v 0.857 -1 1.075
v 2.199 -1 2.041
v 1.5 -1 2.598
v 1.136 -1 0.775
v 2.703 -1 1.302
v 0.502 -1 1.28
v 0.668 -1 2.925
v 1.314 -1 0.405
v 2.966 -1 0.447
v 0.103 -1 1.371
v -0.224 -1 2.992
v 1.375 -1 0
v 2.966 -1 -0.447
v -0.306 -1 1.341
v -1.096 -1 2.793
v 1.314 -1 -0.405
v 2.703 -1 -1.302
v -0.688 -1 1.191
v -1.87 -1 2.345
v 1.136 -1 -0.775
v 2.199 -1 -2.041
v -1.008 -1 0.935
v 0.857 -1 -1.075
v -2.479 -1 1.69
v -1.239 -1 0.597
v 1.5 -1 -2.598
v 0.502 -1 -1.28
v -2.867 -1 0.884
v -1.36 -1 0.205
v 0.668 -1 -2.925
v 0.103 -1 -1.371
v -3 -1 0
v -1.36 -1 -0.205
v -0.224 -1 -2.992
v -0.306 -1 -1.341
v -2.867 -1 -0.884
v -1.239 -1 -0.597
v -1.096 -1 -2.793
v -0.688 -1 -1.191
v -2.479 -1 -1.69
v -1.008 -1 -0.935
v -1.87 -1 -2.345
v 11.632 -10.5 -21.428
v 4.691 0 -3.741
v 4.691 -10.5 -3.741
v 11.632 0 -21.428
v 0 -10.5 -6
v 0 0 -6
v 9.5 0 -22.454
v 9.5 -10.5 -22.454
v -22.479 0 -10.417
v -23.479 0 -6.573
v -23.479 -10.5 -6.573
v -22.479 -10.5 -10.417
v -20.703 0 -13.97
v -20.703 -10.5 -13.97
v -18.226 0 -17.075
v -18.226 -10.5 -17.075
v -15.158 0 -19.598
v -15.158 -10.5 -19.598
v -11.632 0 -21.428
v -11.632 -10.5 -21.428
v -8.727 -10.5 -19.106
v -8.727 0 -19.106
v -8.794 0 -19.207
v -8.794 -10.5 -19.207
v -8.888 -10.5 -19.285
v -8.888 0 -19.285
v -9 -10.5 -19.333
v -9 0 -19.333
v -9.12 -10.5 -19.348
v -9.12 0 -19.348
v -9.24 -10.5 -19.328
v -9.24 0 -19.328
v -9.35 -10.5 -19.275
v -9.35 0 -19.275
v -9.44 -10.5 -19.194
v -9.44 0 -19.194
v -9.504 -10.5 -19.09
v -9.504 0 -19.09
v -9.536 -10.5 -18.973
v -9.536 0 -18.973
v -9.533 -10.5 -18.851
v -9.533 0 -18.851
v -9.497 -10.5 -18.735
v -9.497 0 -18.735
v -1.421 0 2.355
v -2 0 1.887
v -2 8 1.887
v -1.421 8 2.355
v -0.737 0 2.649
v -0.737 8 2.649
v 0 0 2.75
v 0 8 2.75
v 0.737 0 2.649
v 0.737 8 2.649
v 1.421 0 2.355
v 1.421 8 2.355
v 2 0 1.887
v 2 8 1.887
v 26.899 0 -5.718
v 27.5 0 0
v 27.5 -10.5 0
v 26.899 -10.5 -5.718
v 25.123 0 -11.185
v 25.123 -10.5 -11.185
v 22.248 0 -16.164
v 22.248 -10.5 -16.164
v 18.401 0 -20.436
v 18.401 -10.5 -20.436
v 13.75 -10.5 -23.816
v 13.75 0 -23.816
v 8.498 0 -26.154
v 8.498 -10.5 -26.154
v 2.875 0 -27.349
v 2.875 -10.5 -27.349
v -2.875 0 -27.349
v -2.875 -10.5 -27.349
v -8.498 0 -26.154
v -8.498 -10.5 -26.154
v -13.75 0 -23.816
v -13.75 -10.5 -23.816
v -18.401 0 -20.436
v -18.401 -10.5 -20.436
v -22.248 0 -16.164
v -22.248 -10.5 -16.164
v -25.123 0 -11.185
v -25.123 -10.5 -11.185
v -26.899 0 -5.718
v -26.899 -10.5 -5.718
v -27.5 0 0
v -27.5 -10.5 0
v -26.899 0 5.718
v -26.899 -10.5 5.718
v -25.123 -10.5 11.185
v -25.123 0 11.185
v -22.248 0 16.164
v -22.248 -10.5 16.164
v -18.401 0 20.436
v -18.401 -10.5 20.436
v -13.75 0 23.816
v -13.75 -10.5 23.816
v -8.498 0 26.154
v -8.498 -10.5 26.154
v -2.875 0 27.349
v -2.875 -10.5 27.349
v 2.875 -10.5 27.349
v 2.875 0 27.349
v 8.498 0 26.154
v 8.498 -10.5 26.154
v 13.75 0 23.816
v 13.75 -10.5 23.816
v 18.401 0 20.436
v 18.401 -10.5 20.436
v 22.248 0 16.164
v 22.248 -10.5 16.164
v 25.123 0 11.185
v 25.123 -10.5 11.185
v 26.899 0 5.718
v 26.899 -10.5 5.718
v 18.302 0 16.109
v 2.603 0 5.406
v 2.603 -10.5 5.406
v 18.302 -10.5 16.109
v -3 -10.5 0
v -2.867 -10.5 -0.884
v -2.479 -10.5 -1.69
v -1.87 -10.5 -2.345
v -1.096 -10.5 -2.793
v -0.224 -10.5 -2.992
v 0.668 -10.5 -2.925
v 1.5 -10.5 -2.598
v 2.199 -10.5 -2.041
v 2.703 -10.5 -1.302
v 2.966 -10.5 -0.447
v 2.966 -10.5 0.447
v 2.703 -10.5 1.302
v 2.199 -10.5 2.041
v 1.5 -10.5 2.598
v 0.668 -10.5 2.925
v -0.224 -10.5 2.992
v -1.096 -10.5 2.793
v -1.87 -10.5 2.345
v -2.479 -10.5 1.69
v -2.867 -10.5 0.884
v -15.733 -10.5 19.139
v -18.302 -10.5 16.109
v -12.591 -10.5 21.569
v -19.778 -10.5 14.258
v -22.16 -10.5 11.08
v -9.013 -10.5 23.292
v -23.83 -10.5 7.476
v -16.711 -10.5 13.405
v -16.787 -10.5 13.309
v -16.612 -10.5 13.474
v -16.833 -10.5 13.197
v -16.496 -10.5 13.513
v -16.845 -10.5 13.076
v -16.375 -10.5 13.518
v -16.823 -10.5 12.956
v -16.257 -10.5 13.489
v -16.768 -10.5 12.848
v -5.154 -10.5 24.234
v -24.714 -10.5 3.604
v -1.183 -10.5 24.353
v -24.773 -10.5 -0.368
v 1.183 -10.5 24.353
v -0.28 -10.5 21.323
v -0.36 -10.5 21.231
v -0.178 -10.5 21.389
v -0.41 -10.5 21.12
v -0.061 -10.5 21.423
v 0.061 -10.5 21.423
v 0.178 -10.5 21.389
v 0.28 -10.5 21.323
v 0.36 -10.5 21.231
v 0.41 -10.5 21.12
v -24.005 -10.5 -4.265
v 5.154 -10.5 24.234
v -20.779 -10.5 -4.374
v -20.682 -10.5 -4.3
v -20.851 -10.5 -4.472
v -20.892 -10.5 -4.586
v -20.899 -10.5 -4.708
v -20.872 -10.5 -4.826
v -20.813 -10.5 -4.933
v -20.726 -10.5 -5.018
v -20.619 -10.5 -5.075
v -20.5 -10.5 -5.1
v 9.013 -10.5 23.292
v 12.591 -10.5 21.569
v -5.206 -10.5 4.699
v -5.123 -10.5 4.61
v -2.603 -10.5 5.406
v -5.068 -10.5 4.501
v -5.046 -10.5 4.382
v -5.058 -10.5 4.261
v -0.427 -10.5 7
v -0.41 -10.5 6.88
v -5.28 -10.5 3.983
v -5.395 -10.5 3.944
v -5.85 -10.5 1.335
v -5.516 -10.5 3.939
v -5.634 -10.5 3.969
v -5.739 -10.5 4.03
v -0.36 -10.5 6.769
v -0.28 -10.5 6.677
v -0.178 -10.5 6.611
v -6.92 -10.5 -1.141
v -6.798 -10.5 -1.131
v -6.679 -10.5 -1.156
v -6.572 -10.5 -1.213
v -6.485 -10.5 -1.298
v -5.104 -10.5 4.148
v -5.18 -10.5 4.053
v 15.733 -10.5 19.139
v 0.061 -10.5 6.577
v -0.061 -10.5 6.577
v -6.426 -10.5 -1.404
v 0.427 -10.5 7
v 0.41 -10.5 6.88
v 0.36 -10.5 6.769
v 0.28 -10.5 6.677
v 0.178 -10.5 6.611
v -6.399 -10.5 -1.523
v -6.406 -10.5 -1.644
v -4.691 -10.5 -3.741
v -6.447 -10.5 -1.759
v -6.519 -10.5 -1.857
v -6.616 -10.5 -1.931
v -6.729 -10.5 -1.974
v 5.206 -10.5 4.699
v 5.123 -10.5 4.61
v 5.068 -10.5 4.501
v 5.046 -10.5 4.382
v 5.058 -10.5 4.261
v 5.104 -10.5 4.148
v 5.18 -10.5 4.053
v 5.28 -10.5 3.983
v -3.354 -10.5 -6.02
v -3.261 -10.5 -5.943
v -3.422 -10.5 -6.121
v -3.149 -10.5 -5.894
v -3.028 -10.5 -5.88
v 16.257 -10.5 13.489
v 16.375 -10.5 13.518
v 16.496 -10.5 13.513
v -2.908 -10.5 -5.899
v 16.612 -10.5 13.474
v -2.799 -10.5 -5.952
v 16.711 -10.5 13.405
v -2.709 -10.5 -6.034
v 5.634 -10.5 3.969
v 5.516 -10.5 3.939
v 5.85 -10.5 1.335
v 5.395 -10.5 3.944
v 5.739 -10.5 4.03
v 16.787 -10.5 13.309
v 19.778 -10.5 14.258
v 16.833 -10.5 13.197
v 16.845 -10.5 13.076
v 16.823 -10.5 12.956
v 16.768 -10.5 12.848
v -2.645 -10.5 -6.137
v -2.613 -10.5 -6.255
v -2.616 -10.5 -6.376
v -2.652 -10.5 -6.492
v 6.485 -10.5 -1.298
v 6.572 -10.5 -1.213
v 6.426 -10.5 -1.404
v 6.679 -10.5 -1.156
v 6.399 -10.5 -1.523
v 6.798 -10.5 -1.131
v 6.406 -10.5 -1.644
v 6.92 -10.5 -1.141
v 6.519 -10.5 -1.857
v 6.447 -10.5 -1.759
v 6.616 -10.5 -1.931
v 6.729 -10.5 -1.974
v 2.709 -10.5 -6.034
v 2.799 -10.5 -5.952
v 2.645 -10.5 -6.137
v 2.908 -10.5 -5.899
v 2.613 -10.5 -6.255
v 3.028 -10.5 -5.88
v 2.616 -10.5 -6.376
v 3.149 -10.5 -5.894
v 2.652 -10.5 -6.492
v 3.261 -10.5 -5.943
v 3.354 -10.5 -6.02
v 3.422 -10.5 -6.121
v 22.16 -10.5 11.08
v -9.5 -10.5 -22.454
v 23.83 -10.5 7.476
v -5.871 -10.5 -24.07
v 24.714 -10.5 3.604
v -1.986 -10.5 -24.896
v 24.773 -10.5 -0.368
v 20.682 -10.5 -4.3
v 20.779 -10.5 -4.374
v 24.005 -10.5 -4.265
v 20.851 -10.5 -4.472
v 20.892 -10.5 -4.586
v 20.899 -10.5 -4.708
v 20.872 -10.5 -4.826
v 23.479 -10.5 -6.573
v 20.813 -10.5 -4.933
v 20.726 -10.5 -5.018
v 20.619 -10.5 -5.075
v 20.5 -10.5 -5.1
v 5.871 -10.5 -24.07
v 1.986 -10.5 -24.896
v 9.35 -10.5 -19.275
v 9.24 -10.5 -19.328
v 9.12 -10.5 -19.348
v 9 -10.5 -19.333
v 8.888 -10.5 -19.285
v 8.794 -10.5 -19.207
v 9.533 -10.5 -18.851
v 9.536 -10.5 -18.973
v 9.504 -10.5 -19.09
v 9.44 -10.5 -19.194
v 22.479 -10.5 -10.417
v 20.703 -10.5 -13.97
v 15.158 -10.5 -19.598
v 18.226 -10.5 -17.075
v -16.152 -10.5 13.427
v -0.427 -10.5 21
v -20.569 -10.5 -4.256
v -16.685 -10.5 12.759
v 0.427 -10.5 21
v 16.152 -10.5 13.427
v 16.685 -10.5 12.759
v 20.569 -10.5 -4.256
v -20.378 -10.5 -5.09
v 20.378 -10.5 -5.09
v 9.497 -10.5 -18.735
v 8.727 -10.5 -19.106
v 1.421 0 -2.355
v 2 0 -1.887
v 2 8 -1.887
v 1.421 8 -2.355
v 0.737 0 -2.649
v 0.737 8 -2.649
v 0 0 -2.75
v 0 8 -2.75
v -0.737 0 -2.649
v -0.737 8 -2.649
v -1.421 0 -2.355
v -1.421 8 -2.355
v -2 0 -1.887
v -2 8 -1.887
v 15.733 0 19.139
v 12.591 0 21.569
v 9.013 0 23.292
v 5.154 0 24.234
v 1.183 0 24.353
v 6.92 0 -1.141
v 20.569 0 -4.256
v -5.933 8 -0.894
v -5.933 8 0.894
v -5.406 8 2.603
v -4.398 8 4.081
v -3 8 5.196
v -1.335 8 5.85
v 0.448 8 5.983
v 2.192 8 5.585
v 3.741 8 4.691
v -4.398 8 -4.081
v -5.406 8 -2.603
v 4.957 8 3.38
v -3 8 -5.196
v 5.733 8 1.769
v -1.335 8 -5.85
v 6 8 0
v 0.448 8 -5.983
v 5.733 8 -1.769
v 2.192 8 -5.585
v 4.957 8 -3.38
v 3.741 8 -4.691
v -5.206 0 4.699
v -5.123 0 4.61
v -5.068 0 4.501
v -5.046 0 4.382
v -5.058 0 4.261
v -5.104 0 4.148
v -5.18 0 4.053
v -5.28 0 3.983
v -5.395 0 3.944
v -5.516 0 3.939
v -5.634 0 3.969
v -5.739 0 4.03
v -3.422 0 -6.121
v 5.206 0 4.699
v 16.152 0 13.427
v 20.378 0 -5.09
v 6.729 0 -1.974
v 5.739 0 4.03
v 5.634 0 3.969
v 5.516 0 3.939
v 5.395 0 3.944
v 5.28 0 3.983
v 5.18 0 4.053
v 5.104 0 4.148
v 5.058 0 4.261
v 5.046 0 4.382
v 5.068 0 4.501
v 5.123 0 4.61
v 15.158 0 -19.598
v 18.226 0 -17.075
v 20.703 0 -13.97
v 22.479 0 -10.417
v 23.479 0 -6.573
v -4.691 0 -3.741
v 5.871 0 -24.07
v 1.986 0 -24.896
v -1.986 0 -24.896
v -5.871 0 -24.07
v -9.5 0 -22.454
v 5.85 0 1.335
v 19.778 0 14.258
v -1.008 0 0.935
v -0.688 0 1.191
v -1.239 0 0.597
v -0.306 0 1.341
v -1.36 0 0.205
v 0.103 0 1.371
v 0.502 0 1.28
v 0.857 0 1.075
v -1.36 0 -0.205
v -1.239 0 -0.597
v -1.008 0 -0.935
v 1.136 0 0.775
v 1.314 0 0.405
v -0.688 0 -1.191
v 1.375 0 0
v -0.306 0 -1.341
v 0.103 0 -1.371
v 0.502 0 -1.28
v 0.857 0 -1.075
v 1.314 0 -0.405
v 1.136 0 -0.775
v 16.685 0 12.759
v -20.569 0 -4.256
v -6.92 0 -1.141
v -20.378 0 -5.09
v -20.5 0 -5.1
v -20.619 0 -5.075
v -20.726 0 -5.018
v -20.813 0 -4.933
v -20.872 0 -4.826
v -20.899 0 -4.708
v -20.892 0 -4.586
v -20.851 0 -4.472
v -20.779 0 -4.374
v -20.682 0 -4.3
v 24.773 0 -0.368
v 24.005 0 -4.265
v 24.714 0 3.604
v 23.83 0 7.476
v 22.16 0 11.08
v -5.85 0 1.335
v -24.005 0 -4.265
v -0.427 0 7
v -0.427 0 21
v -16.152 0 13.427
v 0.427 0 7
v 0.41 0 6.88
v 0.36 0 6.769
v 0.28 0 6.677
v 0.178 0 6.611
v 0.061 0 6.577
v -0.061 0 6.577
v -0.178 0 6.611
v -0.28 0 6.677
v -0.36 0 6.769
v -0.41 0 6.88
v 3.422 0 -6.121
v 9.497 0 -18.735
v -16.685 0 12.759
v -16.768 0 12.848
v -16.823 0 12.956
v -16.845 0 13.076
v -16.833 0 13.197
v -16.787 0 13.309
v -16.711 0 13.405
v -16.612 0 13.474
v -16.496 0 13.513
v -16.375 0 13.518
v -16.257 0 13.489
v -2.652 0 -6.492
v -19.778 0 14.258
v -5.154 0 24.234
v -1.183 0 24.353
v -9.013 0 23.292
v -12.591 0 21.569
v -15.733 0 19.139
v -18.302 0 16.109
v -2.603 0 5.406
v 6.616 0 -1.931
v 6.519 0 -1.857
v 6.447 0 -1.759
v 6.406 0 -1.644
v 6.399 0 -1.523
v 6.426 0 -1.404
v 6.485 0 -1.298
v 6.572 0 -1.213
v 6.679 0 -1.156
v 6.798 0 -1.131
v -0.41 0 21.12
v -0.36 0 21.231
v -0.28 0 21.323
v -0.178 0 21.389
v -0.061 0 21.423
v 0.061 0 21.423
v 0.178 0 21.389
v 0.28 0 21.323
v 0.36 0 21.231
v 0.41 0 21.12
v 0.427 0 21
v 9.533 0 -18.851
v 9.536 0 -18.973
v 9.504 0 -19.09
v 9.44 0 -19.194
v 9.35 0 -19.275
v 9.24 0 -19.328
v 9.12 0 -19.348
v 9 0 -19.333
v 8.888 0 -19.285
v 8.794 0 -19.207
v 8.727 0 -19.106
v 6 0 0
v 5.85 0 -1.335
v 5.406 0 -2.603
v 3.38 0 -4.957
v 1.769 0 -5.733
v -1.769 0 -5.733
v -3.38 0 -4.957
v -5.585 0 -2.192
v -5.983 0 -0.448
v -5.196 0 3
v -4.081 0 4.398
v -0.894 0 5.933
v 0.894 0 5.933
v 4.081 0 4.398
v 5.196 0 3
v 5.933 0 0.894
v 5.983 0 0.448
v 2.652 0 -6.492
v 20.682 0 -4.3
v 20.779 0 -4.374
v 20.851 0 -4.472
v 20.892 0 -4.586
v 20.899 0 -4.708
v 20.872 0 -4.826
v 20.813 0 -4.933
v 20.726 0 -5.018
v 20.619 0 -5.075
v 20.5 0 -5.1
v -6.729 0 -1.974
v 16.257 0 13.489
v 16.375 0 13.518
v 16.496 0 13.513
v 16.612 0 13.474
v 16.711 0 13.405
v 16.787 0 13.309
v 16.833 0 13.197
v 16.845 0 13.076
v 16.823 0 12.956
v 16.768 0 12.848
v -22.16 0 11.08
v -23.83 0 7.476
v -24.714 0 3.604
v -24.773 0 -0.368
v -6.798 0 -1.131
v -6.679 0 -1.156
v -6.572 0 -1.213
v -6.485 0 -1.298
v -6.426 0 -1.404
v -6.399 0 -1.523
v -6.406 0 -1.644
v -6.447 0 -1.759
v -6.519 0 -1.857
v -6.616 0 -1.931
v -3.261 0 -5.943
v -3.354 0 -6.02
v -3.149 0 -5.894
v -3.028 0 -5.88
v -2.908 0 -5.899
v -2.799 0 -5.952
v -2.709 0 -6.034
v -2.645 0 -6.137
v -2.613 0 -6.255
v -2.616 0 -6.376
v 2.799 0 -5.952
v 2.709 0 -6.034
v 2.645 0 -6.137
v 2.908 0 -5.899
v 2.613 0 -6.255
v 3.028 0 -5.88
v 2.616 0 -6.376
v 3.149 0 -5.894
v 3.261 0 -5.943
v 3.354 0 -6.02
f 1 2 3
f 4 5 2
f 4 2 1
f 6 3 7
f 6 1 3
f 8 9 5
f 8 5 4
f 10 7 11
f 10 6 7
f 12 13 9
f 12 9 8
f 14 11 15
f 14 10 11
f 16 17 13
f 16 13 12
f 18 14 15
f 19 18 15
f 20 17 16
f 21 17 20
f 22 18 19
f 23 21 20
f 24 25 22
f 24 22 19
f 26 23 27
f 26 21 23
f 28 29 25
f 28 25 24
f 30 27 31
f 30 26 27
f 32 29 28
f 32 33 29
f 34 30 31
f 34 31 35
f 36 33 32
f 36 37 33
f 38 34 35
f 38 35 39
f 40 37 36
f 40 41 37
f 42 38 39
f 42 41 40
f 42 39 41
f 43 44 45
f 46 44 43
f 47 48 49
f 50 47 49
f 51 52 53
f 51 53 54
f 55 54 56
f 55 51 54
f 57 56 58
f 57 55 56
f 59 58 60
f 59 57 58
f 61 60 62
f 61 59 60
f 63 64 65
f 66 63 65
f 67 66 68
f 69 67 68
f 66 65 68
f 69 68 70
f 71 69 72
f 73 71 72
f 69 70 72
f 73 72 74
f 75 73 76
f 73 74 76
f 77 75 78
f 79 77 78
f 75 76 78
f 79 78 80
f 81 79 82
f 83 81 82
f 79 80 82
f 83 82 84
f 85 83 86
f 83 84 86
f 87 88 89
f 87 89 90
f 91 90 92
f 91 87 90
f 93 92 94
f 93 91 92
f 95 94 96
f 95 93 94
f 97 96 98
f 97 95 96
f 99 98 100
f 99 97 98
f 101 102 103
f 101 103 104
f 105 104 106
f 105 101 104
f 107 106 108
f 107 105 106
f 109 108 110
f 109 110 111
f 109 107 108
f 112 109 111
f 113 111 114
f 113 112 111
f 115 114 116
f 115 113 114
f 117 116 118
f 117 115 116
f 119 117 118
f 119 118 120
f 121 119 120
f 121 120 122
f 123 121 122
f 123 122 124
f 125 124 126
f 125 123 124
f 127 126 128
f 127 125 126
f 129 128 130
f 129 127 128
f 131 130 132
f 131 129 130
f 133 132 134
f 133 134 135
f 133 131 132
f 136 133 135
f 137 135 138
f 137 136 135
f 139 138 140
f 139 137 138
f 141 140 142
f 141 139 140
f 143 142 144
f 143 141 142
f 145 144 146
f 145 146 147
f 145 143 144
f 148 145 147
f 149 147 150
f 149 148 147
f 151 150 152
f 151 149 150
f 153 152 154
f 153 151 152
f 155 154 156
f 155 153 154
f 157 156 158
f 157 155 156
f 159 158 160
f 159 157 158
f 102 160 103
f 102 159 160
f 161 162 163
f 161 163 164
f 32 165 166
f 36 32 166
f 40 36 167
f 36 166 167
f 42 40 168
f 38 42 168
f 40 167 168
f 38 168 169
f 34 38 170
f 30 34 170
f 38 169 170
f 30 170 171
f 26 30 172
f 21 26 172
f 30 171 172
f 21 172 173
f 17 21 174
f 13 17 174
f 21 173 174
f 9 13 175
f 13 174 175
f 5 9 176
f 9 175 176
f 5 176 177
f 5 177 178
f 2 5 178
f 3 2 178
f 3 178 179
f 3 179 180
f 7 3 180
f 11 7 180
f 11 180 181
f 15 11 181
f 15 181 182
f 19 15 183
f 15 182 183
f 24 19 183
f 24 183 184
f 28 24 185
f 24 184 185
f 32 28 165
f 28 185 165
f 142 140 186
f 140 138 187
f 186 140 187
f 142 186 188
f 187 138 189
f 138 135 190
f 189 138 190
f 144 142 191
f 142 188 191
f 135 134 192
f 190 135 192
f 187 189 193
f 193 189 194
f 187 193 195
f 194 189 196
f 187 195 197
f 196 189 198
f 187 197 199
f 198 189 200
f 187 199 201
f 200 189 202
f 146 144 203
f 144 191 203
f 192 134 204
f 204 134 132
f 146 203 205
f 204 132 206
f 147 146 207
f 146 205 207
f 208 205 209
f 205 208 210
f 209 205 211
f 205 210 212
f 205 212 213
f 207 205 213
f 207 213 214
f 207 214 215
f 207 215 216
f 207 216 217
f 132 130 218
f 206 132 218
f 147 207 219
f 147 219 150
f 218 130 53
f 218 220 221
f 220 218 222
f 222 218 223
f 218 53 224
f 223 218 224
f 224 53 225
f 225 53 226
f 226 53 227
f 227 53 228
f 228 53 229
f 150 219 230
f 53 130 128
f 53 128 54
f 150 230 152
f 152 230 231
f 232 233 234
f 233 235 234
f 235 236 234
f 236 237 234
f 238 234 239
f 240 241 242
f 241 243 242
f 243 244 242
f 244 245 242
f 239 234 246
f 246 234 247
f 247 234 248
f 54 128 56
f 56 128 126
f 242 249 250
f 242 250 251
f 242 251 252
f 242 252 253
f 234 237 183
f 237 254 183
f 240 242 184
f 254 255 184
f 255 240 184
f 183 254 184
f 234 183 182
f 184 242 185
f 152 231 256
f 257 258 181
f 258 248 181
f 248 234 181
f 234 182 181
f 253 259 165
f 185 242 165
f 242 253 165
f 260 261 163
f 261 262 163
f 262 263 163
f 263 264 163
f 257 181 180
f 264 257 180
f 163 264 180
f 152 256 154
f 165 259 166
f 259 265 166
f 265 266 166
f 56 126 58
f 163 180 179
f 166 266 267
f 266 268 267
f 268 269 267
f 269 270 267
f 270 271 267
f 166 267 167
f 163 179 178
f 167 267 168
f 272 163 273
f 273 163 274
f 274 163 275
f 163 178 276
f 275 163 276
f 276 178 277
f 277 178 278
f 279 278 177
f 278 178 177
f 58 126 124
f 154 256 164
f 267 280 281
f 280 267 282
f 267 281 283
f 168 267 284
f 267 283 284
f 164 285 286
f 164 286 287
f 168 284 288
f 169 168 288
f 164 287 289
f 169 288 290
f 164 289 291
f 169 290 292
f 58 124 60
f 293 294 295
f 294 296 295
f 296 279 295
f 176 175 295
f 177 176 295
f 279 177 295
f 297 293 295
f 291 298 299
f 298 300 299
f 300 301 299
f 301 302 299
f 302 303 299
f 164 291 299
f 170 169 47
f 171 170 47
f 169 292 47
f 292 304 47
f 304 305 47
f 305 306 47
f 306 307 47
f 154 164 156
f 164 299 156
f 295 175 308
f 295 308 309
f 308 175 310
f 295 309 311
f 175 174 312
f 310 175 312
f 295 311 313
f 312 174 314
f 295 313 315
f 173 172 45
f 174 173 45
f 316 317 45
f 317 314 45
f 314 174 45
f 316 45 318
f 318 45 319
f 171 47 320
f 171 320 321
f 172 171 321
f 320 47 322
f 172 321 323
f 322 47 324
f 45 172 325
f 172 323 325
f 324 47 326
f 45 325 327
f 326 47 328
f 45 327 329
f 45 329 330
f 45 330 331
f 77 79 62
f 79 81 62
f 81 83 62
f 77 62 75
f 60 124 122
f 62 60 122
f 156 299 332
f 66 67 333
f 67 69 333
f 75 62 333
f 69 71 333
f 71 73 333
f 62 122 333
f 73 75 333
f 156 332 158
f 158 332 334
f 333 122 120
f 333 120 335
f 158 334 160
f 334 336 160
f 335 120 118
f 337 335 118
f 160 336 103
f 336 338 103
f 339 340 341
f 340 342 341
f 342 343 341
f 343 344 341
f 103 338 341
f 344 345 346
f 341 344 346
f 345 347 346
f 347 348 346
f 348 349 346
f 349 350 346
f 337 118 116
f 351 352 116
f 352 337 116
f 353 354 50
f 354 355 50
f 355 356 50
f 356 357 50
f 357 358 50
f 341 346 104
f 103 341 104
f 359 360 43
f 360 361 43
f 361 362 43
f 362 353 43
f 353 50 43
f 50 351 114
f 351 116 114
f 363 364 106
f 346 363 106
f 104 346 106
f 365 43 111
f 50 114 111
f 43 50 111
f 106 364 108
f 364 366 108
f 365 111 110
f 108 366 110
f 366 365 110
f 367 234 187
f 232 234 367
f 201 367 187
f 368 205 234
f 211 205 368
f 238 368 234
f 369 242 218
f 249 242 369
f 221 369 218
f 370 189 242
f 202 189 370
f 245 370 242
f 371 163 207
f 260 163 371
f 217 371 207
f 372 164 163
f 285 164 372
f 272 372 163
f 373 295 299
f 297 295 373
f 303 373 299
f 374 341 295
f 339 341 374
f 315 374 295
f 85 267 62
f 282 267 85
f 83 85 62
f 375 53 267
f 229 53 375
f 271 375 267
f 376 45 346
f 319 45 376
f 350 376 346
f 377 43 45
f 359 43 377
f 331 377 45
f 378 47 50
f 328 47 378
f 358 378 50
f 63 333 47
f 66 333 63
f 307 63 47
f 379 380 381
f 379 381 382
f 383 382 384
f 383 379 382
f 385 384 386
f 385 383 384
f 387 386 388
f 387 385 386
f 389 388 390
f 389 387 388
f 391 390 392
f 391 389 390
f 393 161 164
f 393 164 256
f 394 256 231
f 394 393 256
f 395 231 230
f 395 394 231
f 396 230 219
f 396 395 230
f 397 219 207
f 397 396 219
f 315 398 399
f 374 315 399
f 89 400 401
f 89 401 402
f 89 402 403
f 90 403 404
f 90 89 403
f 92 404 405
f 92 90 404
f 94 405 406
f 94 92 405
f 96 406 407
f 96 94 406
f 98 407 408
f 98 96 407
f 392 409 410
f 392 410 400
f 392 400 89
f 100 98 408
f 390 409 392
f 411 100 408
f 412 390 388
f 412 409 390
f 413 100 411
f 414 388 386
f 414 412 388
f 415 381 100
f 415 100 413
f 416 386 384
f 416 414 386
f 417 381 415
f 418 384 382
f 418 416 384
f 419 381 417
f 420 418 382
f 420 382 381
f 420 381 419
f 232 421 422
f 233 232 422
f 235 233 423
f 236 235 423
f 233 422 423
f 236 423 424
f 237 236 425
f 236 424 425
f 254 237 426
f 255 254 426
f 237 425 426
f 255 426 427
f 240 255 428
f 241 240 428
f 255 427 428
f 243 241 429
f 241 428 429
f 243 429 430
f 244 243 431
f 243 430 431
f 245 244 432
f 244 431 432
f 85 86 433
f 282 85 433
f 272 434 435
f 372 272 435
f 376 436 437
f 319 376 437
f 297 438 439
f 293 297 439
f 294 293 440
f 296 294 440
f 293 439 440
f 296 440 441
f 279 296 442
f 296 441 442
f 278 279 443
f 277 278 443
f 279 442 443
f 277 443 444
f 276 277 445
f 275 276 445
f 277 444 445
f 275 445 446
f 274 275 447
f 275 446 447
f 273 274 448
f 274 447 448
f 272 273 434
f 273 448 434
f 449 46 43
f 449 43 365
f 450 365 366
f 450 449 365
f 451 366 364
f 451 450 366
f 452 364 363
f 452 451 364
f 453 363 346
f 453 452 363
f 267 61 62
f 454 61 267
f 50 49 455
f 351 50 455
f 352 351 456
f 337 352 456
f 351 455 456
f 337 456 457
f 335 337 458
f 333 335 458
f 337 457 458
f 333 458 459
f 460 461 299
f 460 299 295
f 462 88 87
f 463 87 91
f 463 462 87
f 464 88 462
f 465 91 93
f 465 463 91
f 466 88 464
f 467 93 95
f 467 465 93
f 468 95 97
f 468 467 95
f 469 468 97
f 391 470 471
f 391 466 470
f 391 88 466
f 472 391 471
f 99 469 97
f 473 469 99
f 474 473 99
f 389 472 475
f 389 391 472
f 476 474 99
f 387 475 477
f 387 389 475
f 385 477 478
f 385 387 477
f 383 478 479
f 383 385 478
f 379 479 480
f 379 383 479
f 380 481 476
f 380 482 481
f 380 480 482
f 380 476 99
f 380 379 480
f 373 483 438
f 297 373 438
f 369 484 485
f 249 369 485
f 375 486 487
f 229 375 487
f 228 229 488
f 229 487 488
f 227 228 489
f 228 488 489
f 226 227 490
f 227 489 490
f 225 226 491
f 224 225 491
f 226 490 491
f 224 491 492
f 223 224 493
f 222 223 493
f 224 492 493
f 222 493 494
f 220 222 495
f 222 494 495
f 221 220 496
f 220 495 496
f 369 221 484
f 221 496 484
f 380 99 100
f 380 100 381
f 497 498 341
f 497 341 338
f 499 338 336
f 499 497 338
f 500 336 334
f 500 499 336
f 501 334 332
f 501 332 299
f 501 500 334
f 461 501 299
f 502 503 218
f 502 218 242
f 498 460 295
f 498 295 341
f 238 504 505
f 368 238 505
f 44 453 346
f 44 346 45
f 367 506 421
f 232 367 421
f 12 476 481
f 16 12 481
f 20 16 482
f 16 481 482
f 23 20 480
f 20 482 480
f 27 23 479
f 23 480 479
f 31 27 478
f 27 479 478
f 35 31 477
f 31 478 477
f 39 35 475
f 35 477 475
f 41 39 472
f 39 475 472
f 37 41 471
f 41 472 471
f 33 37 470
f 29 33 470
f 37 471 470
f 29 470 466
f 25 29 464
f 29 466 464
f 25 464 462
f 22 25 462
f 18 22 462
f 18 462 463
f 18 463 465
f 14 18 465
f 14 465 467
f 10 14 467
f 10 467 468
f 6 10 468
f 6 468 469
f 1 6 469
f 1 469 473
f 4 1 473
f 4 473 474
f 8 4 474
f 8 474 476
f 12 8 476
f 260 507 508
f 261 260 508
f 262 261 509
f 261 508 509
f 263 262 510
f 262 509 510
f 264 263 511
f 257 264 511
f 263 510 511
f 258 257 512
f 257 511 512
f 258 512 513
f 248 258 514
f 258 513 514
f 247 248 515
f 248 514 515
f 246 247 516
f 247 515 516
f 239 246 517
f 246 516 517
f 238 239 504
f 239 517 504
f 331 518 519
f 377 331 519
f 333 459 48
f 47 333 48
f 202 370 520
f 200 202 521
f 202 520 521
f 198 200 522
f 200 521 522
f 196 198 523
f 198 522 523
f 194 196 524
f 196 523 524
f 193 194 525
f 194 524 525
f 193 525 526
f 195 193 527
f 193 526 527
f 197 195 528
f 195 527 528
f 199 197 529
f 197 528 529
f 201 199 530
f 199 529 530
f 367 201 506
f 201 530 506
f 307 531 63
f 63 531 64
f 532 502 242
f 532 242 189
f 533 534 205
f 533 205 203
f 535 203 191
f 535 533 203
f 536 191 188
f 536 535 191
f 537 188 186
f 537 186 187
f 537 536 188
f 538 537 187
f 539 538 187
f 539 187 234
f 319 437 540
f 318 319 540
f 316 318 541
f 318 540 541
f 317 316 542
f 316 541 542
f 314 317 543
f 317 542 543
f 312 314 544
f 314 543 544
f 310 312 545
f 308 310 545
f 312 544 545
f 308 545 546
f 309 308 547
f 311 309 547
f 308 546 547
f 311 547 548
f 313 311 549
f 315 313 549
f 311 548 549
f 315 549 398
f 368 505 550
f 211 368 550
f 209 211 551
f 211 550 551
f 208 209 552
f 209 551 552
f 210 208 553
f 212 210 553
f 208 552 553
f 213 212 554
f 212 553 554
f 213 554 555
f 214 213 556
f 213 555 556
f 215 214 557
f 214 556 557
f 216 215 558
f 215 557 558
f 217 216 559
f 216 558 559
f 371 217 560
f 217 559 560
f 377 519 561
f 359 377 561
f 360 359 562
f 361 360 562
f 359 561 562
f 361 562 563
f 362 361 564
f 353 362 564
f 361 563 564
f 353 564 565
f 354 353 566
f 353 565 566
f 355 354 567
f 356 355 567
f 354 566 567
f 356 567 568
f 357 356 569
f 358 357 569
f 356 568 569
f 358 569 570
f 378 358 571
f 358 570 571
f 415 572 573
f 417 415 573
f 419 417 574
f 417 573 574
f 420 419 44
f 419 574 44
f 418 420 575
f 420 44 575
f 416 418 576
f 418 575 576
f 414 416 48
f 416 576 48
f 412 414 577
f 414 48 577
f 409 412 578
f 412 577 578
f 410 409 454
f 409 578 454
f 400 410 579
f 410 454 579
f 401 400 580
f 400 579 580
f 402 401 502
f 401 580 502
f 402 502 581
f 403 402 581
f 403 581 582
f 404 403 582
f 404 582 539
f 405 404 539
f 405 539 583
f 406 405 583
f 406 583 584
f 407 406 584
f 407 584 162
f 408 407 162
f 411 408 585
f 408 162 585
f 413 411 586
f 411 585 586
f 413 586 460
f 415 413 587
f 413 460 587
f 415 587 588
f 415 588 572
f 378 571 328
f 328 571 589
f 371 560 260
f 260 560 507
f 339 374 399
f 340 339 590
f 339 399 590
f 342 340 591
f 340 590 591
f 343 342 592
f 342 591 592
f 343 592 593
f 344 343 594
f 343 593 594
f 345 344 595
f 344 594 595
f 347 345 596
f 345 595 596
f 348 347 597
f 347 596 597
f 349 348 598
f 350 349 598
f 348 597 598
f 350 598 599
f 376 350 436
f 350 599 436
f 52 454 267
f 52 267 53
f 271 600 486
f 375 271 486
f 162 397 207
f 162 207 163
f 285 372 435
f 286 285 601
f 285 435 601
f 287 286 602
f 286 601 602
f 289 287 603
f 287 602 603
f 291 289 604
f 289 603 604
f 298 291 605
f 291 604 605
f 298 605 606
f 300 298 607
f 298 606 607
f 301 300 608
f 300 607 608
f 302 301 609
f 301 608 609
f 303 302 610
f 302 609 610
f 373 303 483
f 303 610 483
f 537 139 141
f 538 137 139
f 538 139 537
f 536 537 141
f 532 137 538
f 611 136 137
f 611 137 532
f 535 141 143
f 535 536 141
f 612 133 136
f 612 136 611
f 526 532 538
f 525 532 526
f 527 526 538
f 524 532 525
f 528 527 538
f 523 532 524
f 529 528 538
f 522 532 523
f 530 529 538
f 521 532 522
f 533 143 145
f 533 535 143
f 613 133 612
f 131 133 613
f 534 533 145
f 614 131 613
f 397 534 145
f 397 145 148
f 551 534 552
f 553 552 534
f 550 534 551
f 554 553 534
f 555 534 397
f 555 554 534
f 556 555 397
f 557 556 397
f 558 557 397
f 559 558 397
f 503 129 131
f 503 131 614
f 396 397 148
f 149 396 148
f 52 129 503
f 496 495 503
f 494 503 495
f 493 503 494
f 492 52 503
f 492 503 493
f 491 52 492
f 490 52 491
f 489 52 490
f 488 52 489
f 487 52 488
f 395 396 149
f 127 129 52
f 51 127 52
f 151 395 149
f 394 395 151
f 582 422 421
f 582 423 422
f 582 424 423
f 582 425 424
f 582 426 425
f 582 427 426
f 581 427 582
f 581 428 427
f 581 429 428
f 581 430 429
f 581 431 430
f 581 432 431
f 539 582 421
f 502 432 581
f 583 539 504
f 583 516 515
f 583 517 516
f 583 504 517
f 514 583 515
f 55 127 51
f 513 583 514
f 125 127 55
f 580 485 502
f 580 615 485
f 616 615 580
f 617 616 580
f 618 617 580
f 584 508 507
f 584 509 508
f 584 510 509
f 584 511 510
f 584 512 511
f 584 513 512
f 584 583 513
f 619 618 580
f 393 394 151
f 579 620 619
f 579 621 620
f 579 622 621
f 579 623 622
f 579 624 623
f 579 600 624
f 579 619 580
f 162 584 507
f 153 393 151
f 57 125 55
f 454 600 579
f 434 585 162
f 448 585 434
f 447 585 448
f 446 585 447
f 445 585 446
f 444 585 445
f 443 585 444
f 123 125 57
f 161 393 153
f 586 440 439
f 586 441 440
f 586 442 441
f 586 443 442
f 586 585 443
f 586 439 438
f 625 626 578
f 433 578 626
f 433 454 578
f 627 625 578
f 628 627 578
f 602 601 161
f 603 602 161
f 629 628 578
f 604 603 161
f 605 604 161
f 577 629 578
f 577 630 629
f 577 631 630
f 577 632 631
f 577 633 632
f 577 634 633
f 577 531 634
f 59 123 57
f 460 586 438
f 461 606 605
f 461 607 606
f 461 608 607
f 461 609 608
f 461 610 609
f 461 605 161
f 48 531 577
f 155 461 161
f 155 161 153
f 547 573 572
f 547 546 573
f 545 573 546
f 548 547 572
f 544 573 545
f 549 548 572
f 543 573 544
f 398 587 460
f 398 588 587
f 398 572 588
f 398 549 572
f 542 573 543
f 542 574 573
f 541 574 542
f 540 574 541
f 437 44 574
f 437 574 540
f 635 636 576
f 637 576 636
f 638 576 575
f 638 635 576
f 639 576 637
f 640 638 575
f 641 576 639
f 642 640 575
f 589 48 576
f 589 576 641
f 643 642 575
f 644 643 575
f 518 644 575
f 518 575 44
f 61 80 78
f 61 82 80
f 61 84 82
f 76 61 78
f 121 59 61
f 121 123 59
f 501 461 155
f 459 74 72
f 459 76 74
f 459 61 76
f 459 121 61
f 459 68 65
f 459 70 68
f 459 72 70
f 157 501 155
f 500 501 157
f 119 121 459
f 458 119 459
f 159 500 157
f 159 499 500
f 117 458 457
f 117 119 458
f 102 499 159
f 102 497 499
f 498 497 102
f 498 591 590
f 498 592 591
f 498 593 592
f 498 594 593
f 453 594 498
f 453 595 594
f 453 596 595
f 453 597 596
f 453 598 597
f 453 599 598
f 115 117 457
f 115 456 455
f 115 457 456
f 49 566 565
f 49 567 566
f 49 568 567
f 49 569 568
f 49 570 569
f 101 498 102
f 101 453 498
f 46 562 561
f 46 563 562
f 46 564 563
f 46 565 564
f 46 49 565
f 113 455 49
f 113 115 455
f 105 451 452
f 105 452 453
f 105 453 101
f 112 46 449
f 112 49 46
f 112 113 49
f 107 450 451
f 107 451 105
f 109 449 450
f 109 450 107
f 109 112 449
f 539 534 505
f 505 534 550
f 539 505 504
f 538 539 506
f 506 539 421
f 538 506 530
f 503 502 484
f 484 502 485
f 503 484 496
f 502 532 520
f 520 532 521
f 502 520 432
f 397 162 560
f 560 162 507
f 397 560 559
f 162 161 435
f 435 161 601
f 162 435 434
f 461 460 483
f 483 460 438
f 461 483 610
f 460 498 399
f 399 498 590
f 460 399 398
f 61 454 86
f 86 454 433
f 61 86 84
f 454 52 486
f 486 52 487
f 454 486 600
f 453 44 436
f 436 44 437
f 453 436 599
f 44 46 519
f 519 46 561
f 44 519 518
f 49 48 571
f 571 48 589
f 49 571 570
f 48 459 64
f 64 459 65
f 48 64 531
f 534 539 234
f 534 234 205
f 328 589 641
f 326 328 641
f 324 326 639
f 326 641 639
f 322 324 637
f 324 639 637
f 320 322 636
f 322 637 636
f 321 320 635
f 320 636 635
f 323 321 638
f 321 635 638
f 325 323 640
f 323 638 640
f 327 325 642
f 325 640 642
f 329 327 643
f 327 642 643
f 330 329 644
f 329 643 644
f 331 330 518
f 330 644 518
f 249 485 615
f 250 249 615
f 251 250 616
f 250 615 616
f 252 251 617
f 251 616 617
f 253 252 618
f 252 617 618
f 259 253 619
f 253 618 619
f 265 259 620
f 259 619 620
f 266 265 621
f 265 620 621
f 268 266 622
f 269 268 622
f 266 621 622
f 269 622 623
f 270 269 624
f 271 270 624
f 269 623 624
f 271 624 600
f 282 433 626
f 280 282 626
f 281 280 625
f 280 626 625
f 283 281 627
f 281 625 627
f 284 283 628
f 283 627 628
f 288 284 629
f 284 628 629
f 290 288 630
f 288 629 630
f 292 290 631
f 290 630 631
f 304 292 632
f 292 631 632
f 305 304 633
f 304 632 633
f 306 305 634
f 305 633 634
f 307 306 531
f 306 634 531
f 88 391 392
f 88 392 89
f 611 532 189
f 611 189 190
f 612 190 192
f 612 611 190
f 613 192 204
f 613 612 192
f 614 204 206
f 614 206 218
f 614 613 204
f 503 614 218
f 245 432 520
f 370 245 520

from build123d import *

# Parameters (mm, degrees)
SKETCH2_R           = 6
BOSS_EXTRUDE1_DEPTH = 8
SKETCH3_R           = 27.5
SKETCH3_R_2         = 1.375
BOSS_EXTRUDE2_DEPTH = 10.5
SKETCH4_R           = 3
CUT_EXTRUDE1_DEPTH  = 9.5
CUT_EXTRUDE2_REACH  = 12.5


with BuildPart() as part:
    # Sketch2 → Boss-Extrude1 (new body)
    with BuildSketch(Plane(origin=(0, 0, 0), x_dir=(1, 0, 0), z_dir=(0, 1, 0))):
        Circle(SKETCH2_R)
        with BuildLine():
            ThreePointArc((-2, -1.887458609), (0, -2.75), (2, -1.887458609))
            Line((2, -1.887458609), (2, 1.887458609))
            ThreePointArc((2, 1.887458609), (0, 2.75), (-2, 1.887458609))
            Line((-2, 1.887458609), (-2, -1.887458609))
        make_face(mode=Mode.SUBTRACT)
    extrude(amount=BOSS_EXTRUDE1_DEPTH)

    # Sketch3 → Boss-Extrude2 (add)
    with BuildSketch(Plane(origin=(0, 0, 0), x_dir=(1, 0, 0), z_dir=(0, 1, 0))):
        Circle(SKETCH3_R)
        Circle(SKETCH3_R_2, mode=Mode.SUBTRACT)
        with BuildLine():
            Line((0, 6), (9.5, 22.454482672))
            ThreePointArc((9.5, 22.454482672), (0, 25), (-9.5, 22.454482672))
            Line((-9.5, 22.454482672), (0, 6))
        make_face(mode=Mode.SUBTRACT)
        with BuildLine():
            Line((4.690988895, 3.740938811), (11.632468358, 21.427540035))
            ThreePointArc((11.632468358, 21.427540035), (19.545787062, 15.587245046), (23.478774593, 6.572741869))
            Line((23.478774593, 6.572741869), (4.690988895, 3.740938811))
        make_face(mode=Mode.SUBTRACT)
        with BuildLine():
            Line((5.849567473, -1.335125604), (24.005450783, 4.26522271))
            ThreePointArc((24.005450783, 4.26522271), (24.373197805, -5.563023349), (19.777553038, -14.258407621))
            Line((19.777553038, -14.258407621), (5.849567473, -1.335125604))
        make_face(mode=Mode.SUBTRACT)
        with BuildLine():
            Line((2.603302435, -5.405813207), (18.301839147, -16.108894311))
            ThreePointArc((18.301839147, -16.108894311), (10.847093478, -22.524221698), (1.183430657, -24.352685354))
            Line((1.183430657, -24.352685354), (2.603302435, -5.405813207))
        make_face(mode=Mode.SUBTRACT)
        with BuildLine():
            Line((-2.603302435, -5.405813207), (-1.183430657, -24.352685354))
            ThreePointArc((-1.183430657, -24.352685354), (-10.847093478, -22.524221698), (-18.301839147, -16.108894311))
            Line((-18.301839147, -16.108894311), (-2.603302435, -5.405813207))
        make_face(mode=Mode.SUBTRACT)
        with BuildLine():
            Line((-5.849567473, -1.335125604), (-19.777553038, -14.258407621))
            ThreePointArc((-19.777553038, -14.258407621), (-24.373197805, -5.563023349), (-24.005450783, 4.26522271))
            Line((-24.005450783, 4.26522271), (-5.849567473, -1.335125604))
        make_face(mode=Mode.SUBTRACT)
        with BuildLine():
            Line((-4.690988895, 3.740938811), (-23.478774593, 6.572741868))
            ThreePointArc((-23.478774593, 6.572741868), (-19.545787062, 15.587245046), (-11.632468358, 21.427540035))
            Line((-11.632468358, 21.427540035), (-4.690988895, 3.740938811))
        make_face(mode=Mode.SUBTRACT)
    extrude(amount=-BOSS_EXTRUDE2_DEPTH)

    # Sketch4 → Cut-Extrude1 (cut)
    with BuildSketch(Plane(origin=(0, -10.5, 0), x_dir=(-1, 0, 0), z_dir=(0, -1, 0))):
        Circle(SKETCH4_R)
    extrude(amount=-CUT_EXTRUDE1_DEPTH, mode=Mode.SUBTRACT)

    # Sketch5 → Cut-Extrude2 (cut, up to next)
    with BuildSketch(Plane(origin=(0, 0, 0), x_dir=(1, 0, 0), z_dir=(0, 1, 0)), mode=Mode.PRIVATE) as cut_extrude2_sk1:
        with BuildLine():
            ThreePointArc((-5.206364569, -4.698553628), (-5.138695362, -4.097972805), (-5.739276185, -4.030303598))
            Line((-5.739276185, -4.030303598), (-16.68491694, -12.759160824))
            ThreePointArc((-16.68491694, -12.759160824), (-16.752586147, -13.359741647), (-16.152005324, -13.427410854))
            Line((-16.152005324, -13.427410854), (-5.206364569, -4.698553628))
        make_face()
    cut_extrude2_tool1 = extrude(cut_extrude2_sk1.sketch, amount=-CUT_EXTRUDE2_REACH, mode=Mode.PRIVATE) & part.part
    add(cut_extrude2_tool1.solids().sort_by_distance((-10.945641, 0, 8.728857))[0], mode=Mode.SUBTRACT)
    # Sketch5 → Cut-Extrude2 (cut, up to next)
    with BuildSketch(Plane(origin=(0, 0, 0), x_dir=(1, 0, 0), z_dir=(0, 1, 0)), mode=Mode.PRIVATE) as cut_extrude2_sk2:
        with BuildLine():
            Line((0.427361935, -21), (0.427361935, -7))
            ThreePointArc((0.427361935, -7), (0, -6.572638065), (-0.427361935, -7))
            Line((-0.427361935, -7), (-0.427361935, -21))
            ThreePointArc((-0.427361935, -21), (0, -21.427361935), (0.427361935, -21))
        make_face()
    cut_extrude2_tool2 = extrude(cut_extrude2_sk2.sketch, amount=-CUT_EXTRUDE2_REACH, mode=Mode.PRIVATE) & part.part
    add(cut_extrude2_tool2.solids().sort_by_distance((0, 0, 14))[0], mode=Mode.SUBTRACT)
    # Sketch5 → Cut-Extrude2 (cut, up to next)
    with BuildSketch(Plane(origin=(0, 0, 0), x_dir=(1, 0, 0), z_dir=(0, 1, 0)), mode=Mode.PRIVATE) as cut_extrude2_sk3:
        with BuildLine():
            ThreePointArc((-6.919592362, 1.140999459), (-6.407848306, 1.462549561), (-6.729398408, 1.974293617))
            Line((-6.729398408, 1.974293617), (-20.378389179, 5.089586692))
            ThreePointArc((-20.378389179, 5.089586692), (-20.890133235, 4.76803659), (-20.568583133, 4.256292534))
            Line((-20.568583133, 4.256292534), (-6.919592362, 1.140999459))
        make_face()
    cut_extrude2_tool3 = extrude(cut_extrude2_sk3.sketch, amount=-CUT_EXTRUDE2_REACH, mode=Mode.PRIVATE) & part.part
    add(cut_extrude2_tool3.solids().sort_by_distance((-13.648991, 0, -3.115293))[0], mode=Mode.SUBTRACT)
    # Sketch5 → Cut-Extrude2 (cut, up to next)
    with BuildSketch(Plane(origin=(0, 0, 0), x_dir=(1, 0, 0), z_dir=(0, 1, 0)), mode=Mode.PRIVATE) as cut_extrude2_sk4:
        with BuildLine():
            ThreePointArc((-3.422225972, 6.121356681), (-2.85176078, 5.921742277), (-2.652146375, 6.49220747))
            Line((-2.652146375, 6.49220747), (-8.726518723, 19.10577162))
            ThreePointArc((-8.726518723, 19.10577162), (-9.296983916, 19.305386025), (-9.49659832, 18.734920832))
            Line((-9.49659832, 18.734920832), (-3.422225972, 6.121356681))
        make_face()
    cut_extrude2_tool4 = extrude(cut_extrude2_sk4.sketch, amount=-CUT_EXTRUDE2_REACH, mode=Mode.PRIVATE) & part.part
    add(cut_extrude2_tool4.solids().sort_by_distance((-6.074372, 0, -12.613564))[0], mode=Mode.SUBTRACT)
    # Sketch5 → Cut-Extrude2 (cut, up to next)
    with BuildSketch(Plane(origin=(0, 0, 0), x_dir=(1, 0, 0), z_dir=(0, 1, 0)), mode=Mode.PRIVATE) as cut_extrude2_sk5:
        with BuildLine():
            ThreePointArc((2.652146375, 6.49220747), (2.85176078, 5.921742277), (3.422225972, 6.121356681))
            Line((3.422225972, 6.121356681), (9.49659832, 18.734920832))
            ThreePointArc((9.49659832, 18.734920832), (9.296983916, 19.305386025), (8.726518723, 19.10577162))
            Line((8.726518723, 19.10577162), (2.652146375, 6.49220747))
        make_face()
    cut_extrude2_tool5 = extrude(cut_extrude2_sk5.sketch, amount=-CUT_EXTRUDE2_REACH, mode=Mode.PRIVATE) & part.part
    add(cut_extrude2_tool5.solids().sort_by_distance((6.074372, 0, -12.613564))[0], mode=Mode.SUBTRACT)
    # Sketch5 → Cut-Extrude2 (cut, up to next)
    with BuildSketch(Plane(origin=(0, 0, 0), x_dir=(1, 0, 0), z_dir=(0, 1, 0)), mode=Mode.PRIVATE) as cut_extrude2_sk6:
        with BuildLine():
            ThreePointArc((6.729398408, 1.974293617), (6.407848306, 1.462549561), (6.919592362, 1.140999459))
            Line((6.919592362, 1.140999459), (20.568583133, 4.256292534))
            ThreePointArc((20.568583133, 4.256292534), (20.890133235, 4.76803659), (20.378389179, 5.089586692))
            Line((20.378389179, 5.089586692), (6.729398408, 1.974293617))
        make_face()
    cut_extrude2_tool6 = extrude(cut_extrude2_sk6.sketch, amount=-CUT_EXTRUDE2_REACH, mode=Mode.PRIVATE) & part.part
    add(cut_extrude2_tool6.solids().sort_by_distance((13.648991, 0, -3.115293))[0], mode=Mode.SUBTRACT)
    # Sketch5 → Cut-Extrude2 (cut, up to next)
    with BuildSketch(Plane(origin=(0, 0, 0), x_dir=(1, 0, 0), z_dir=(0, 1, 0)), mode=Mode.PRIVATE) as cut_extrude2_sk7:
        with BuildLine():
            ThreePointArc((5.739276185, -4.030303598), (5.138695362, -4.097972805), (5.206364569, -4.698553628))
            Line((5.206364569, -4.698553628), (16.152005324, -13.427410854))
            ThreePointArc((16.152005324, -13.427410854), (16.752586147, -13.359741647), (16.68491694, -12.759160824))
            Line((16.68491694, -12.759160824), (5.739276185, -4.030303598))
        make_face()
    cut_extrude2_tool7 = extrude(cut_extrude2_sk7.sketch, amount=-CUT_EXTRUDE2_REACH, mode=Mode.PRIVATE) & part.part
    add(cut_extrude2_tool7.solids().sort_by_distance((10.945641, 0, 8.728857))[0], mode=Mode.SUBTRACT)


solid = part.part
